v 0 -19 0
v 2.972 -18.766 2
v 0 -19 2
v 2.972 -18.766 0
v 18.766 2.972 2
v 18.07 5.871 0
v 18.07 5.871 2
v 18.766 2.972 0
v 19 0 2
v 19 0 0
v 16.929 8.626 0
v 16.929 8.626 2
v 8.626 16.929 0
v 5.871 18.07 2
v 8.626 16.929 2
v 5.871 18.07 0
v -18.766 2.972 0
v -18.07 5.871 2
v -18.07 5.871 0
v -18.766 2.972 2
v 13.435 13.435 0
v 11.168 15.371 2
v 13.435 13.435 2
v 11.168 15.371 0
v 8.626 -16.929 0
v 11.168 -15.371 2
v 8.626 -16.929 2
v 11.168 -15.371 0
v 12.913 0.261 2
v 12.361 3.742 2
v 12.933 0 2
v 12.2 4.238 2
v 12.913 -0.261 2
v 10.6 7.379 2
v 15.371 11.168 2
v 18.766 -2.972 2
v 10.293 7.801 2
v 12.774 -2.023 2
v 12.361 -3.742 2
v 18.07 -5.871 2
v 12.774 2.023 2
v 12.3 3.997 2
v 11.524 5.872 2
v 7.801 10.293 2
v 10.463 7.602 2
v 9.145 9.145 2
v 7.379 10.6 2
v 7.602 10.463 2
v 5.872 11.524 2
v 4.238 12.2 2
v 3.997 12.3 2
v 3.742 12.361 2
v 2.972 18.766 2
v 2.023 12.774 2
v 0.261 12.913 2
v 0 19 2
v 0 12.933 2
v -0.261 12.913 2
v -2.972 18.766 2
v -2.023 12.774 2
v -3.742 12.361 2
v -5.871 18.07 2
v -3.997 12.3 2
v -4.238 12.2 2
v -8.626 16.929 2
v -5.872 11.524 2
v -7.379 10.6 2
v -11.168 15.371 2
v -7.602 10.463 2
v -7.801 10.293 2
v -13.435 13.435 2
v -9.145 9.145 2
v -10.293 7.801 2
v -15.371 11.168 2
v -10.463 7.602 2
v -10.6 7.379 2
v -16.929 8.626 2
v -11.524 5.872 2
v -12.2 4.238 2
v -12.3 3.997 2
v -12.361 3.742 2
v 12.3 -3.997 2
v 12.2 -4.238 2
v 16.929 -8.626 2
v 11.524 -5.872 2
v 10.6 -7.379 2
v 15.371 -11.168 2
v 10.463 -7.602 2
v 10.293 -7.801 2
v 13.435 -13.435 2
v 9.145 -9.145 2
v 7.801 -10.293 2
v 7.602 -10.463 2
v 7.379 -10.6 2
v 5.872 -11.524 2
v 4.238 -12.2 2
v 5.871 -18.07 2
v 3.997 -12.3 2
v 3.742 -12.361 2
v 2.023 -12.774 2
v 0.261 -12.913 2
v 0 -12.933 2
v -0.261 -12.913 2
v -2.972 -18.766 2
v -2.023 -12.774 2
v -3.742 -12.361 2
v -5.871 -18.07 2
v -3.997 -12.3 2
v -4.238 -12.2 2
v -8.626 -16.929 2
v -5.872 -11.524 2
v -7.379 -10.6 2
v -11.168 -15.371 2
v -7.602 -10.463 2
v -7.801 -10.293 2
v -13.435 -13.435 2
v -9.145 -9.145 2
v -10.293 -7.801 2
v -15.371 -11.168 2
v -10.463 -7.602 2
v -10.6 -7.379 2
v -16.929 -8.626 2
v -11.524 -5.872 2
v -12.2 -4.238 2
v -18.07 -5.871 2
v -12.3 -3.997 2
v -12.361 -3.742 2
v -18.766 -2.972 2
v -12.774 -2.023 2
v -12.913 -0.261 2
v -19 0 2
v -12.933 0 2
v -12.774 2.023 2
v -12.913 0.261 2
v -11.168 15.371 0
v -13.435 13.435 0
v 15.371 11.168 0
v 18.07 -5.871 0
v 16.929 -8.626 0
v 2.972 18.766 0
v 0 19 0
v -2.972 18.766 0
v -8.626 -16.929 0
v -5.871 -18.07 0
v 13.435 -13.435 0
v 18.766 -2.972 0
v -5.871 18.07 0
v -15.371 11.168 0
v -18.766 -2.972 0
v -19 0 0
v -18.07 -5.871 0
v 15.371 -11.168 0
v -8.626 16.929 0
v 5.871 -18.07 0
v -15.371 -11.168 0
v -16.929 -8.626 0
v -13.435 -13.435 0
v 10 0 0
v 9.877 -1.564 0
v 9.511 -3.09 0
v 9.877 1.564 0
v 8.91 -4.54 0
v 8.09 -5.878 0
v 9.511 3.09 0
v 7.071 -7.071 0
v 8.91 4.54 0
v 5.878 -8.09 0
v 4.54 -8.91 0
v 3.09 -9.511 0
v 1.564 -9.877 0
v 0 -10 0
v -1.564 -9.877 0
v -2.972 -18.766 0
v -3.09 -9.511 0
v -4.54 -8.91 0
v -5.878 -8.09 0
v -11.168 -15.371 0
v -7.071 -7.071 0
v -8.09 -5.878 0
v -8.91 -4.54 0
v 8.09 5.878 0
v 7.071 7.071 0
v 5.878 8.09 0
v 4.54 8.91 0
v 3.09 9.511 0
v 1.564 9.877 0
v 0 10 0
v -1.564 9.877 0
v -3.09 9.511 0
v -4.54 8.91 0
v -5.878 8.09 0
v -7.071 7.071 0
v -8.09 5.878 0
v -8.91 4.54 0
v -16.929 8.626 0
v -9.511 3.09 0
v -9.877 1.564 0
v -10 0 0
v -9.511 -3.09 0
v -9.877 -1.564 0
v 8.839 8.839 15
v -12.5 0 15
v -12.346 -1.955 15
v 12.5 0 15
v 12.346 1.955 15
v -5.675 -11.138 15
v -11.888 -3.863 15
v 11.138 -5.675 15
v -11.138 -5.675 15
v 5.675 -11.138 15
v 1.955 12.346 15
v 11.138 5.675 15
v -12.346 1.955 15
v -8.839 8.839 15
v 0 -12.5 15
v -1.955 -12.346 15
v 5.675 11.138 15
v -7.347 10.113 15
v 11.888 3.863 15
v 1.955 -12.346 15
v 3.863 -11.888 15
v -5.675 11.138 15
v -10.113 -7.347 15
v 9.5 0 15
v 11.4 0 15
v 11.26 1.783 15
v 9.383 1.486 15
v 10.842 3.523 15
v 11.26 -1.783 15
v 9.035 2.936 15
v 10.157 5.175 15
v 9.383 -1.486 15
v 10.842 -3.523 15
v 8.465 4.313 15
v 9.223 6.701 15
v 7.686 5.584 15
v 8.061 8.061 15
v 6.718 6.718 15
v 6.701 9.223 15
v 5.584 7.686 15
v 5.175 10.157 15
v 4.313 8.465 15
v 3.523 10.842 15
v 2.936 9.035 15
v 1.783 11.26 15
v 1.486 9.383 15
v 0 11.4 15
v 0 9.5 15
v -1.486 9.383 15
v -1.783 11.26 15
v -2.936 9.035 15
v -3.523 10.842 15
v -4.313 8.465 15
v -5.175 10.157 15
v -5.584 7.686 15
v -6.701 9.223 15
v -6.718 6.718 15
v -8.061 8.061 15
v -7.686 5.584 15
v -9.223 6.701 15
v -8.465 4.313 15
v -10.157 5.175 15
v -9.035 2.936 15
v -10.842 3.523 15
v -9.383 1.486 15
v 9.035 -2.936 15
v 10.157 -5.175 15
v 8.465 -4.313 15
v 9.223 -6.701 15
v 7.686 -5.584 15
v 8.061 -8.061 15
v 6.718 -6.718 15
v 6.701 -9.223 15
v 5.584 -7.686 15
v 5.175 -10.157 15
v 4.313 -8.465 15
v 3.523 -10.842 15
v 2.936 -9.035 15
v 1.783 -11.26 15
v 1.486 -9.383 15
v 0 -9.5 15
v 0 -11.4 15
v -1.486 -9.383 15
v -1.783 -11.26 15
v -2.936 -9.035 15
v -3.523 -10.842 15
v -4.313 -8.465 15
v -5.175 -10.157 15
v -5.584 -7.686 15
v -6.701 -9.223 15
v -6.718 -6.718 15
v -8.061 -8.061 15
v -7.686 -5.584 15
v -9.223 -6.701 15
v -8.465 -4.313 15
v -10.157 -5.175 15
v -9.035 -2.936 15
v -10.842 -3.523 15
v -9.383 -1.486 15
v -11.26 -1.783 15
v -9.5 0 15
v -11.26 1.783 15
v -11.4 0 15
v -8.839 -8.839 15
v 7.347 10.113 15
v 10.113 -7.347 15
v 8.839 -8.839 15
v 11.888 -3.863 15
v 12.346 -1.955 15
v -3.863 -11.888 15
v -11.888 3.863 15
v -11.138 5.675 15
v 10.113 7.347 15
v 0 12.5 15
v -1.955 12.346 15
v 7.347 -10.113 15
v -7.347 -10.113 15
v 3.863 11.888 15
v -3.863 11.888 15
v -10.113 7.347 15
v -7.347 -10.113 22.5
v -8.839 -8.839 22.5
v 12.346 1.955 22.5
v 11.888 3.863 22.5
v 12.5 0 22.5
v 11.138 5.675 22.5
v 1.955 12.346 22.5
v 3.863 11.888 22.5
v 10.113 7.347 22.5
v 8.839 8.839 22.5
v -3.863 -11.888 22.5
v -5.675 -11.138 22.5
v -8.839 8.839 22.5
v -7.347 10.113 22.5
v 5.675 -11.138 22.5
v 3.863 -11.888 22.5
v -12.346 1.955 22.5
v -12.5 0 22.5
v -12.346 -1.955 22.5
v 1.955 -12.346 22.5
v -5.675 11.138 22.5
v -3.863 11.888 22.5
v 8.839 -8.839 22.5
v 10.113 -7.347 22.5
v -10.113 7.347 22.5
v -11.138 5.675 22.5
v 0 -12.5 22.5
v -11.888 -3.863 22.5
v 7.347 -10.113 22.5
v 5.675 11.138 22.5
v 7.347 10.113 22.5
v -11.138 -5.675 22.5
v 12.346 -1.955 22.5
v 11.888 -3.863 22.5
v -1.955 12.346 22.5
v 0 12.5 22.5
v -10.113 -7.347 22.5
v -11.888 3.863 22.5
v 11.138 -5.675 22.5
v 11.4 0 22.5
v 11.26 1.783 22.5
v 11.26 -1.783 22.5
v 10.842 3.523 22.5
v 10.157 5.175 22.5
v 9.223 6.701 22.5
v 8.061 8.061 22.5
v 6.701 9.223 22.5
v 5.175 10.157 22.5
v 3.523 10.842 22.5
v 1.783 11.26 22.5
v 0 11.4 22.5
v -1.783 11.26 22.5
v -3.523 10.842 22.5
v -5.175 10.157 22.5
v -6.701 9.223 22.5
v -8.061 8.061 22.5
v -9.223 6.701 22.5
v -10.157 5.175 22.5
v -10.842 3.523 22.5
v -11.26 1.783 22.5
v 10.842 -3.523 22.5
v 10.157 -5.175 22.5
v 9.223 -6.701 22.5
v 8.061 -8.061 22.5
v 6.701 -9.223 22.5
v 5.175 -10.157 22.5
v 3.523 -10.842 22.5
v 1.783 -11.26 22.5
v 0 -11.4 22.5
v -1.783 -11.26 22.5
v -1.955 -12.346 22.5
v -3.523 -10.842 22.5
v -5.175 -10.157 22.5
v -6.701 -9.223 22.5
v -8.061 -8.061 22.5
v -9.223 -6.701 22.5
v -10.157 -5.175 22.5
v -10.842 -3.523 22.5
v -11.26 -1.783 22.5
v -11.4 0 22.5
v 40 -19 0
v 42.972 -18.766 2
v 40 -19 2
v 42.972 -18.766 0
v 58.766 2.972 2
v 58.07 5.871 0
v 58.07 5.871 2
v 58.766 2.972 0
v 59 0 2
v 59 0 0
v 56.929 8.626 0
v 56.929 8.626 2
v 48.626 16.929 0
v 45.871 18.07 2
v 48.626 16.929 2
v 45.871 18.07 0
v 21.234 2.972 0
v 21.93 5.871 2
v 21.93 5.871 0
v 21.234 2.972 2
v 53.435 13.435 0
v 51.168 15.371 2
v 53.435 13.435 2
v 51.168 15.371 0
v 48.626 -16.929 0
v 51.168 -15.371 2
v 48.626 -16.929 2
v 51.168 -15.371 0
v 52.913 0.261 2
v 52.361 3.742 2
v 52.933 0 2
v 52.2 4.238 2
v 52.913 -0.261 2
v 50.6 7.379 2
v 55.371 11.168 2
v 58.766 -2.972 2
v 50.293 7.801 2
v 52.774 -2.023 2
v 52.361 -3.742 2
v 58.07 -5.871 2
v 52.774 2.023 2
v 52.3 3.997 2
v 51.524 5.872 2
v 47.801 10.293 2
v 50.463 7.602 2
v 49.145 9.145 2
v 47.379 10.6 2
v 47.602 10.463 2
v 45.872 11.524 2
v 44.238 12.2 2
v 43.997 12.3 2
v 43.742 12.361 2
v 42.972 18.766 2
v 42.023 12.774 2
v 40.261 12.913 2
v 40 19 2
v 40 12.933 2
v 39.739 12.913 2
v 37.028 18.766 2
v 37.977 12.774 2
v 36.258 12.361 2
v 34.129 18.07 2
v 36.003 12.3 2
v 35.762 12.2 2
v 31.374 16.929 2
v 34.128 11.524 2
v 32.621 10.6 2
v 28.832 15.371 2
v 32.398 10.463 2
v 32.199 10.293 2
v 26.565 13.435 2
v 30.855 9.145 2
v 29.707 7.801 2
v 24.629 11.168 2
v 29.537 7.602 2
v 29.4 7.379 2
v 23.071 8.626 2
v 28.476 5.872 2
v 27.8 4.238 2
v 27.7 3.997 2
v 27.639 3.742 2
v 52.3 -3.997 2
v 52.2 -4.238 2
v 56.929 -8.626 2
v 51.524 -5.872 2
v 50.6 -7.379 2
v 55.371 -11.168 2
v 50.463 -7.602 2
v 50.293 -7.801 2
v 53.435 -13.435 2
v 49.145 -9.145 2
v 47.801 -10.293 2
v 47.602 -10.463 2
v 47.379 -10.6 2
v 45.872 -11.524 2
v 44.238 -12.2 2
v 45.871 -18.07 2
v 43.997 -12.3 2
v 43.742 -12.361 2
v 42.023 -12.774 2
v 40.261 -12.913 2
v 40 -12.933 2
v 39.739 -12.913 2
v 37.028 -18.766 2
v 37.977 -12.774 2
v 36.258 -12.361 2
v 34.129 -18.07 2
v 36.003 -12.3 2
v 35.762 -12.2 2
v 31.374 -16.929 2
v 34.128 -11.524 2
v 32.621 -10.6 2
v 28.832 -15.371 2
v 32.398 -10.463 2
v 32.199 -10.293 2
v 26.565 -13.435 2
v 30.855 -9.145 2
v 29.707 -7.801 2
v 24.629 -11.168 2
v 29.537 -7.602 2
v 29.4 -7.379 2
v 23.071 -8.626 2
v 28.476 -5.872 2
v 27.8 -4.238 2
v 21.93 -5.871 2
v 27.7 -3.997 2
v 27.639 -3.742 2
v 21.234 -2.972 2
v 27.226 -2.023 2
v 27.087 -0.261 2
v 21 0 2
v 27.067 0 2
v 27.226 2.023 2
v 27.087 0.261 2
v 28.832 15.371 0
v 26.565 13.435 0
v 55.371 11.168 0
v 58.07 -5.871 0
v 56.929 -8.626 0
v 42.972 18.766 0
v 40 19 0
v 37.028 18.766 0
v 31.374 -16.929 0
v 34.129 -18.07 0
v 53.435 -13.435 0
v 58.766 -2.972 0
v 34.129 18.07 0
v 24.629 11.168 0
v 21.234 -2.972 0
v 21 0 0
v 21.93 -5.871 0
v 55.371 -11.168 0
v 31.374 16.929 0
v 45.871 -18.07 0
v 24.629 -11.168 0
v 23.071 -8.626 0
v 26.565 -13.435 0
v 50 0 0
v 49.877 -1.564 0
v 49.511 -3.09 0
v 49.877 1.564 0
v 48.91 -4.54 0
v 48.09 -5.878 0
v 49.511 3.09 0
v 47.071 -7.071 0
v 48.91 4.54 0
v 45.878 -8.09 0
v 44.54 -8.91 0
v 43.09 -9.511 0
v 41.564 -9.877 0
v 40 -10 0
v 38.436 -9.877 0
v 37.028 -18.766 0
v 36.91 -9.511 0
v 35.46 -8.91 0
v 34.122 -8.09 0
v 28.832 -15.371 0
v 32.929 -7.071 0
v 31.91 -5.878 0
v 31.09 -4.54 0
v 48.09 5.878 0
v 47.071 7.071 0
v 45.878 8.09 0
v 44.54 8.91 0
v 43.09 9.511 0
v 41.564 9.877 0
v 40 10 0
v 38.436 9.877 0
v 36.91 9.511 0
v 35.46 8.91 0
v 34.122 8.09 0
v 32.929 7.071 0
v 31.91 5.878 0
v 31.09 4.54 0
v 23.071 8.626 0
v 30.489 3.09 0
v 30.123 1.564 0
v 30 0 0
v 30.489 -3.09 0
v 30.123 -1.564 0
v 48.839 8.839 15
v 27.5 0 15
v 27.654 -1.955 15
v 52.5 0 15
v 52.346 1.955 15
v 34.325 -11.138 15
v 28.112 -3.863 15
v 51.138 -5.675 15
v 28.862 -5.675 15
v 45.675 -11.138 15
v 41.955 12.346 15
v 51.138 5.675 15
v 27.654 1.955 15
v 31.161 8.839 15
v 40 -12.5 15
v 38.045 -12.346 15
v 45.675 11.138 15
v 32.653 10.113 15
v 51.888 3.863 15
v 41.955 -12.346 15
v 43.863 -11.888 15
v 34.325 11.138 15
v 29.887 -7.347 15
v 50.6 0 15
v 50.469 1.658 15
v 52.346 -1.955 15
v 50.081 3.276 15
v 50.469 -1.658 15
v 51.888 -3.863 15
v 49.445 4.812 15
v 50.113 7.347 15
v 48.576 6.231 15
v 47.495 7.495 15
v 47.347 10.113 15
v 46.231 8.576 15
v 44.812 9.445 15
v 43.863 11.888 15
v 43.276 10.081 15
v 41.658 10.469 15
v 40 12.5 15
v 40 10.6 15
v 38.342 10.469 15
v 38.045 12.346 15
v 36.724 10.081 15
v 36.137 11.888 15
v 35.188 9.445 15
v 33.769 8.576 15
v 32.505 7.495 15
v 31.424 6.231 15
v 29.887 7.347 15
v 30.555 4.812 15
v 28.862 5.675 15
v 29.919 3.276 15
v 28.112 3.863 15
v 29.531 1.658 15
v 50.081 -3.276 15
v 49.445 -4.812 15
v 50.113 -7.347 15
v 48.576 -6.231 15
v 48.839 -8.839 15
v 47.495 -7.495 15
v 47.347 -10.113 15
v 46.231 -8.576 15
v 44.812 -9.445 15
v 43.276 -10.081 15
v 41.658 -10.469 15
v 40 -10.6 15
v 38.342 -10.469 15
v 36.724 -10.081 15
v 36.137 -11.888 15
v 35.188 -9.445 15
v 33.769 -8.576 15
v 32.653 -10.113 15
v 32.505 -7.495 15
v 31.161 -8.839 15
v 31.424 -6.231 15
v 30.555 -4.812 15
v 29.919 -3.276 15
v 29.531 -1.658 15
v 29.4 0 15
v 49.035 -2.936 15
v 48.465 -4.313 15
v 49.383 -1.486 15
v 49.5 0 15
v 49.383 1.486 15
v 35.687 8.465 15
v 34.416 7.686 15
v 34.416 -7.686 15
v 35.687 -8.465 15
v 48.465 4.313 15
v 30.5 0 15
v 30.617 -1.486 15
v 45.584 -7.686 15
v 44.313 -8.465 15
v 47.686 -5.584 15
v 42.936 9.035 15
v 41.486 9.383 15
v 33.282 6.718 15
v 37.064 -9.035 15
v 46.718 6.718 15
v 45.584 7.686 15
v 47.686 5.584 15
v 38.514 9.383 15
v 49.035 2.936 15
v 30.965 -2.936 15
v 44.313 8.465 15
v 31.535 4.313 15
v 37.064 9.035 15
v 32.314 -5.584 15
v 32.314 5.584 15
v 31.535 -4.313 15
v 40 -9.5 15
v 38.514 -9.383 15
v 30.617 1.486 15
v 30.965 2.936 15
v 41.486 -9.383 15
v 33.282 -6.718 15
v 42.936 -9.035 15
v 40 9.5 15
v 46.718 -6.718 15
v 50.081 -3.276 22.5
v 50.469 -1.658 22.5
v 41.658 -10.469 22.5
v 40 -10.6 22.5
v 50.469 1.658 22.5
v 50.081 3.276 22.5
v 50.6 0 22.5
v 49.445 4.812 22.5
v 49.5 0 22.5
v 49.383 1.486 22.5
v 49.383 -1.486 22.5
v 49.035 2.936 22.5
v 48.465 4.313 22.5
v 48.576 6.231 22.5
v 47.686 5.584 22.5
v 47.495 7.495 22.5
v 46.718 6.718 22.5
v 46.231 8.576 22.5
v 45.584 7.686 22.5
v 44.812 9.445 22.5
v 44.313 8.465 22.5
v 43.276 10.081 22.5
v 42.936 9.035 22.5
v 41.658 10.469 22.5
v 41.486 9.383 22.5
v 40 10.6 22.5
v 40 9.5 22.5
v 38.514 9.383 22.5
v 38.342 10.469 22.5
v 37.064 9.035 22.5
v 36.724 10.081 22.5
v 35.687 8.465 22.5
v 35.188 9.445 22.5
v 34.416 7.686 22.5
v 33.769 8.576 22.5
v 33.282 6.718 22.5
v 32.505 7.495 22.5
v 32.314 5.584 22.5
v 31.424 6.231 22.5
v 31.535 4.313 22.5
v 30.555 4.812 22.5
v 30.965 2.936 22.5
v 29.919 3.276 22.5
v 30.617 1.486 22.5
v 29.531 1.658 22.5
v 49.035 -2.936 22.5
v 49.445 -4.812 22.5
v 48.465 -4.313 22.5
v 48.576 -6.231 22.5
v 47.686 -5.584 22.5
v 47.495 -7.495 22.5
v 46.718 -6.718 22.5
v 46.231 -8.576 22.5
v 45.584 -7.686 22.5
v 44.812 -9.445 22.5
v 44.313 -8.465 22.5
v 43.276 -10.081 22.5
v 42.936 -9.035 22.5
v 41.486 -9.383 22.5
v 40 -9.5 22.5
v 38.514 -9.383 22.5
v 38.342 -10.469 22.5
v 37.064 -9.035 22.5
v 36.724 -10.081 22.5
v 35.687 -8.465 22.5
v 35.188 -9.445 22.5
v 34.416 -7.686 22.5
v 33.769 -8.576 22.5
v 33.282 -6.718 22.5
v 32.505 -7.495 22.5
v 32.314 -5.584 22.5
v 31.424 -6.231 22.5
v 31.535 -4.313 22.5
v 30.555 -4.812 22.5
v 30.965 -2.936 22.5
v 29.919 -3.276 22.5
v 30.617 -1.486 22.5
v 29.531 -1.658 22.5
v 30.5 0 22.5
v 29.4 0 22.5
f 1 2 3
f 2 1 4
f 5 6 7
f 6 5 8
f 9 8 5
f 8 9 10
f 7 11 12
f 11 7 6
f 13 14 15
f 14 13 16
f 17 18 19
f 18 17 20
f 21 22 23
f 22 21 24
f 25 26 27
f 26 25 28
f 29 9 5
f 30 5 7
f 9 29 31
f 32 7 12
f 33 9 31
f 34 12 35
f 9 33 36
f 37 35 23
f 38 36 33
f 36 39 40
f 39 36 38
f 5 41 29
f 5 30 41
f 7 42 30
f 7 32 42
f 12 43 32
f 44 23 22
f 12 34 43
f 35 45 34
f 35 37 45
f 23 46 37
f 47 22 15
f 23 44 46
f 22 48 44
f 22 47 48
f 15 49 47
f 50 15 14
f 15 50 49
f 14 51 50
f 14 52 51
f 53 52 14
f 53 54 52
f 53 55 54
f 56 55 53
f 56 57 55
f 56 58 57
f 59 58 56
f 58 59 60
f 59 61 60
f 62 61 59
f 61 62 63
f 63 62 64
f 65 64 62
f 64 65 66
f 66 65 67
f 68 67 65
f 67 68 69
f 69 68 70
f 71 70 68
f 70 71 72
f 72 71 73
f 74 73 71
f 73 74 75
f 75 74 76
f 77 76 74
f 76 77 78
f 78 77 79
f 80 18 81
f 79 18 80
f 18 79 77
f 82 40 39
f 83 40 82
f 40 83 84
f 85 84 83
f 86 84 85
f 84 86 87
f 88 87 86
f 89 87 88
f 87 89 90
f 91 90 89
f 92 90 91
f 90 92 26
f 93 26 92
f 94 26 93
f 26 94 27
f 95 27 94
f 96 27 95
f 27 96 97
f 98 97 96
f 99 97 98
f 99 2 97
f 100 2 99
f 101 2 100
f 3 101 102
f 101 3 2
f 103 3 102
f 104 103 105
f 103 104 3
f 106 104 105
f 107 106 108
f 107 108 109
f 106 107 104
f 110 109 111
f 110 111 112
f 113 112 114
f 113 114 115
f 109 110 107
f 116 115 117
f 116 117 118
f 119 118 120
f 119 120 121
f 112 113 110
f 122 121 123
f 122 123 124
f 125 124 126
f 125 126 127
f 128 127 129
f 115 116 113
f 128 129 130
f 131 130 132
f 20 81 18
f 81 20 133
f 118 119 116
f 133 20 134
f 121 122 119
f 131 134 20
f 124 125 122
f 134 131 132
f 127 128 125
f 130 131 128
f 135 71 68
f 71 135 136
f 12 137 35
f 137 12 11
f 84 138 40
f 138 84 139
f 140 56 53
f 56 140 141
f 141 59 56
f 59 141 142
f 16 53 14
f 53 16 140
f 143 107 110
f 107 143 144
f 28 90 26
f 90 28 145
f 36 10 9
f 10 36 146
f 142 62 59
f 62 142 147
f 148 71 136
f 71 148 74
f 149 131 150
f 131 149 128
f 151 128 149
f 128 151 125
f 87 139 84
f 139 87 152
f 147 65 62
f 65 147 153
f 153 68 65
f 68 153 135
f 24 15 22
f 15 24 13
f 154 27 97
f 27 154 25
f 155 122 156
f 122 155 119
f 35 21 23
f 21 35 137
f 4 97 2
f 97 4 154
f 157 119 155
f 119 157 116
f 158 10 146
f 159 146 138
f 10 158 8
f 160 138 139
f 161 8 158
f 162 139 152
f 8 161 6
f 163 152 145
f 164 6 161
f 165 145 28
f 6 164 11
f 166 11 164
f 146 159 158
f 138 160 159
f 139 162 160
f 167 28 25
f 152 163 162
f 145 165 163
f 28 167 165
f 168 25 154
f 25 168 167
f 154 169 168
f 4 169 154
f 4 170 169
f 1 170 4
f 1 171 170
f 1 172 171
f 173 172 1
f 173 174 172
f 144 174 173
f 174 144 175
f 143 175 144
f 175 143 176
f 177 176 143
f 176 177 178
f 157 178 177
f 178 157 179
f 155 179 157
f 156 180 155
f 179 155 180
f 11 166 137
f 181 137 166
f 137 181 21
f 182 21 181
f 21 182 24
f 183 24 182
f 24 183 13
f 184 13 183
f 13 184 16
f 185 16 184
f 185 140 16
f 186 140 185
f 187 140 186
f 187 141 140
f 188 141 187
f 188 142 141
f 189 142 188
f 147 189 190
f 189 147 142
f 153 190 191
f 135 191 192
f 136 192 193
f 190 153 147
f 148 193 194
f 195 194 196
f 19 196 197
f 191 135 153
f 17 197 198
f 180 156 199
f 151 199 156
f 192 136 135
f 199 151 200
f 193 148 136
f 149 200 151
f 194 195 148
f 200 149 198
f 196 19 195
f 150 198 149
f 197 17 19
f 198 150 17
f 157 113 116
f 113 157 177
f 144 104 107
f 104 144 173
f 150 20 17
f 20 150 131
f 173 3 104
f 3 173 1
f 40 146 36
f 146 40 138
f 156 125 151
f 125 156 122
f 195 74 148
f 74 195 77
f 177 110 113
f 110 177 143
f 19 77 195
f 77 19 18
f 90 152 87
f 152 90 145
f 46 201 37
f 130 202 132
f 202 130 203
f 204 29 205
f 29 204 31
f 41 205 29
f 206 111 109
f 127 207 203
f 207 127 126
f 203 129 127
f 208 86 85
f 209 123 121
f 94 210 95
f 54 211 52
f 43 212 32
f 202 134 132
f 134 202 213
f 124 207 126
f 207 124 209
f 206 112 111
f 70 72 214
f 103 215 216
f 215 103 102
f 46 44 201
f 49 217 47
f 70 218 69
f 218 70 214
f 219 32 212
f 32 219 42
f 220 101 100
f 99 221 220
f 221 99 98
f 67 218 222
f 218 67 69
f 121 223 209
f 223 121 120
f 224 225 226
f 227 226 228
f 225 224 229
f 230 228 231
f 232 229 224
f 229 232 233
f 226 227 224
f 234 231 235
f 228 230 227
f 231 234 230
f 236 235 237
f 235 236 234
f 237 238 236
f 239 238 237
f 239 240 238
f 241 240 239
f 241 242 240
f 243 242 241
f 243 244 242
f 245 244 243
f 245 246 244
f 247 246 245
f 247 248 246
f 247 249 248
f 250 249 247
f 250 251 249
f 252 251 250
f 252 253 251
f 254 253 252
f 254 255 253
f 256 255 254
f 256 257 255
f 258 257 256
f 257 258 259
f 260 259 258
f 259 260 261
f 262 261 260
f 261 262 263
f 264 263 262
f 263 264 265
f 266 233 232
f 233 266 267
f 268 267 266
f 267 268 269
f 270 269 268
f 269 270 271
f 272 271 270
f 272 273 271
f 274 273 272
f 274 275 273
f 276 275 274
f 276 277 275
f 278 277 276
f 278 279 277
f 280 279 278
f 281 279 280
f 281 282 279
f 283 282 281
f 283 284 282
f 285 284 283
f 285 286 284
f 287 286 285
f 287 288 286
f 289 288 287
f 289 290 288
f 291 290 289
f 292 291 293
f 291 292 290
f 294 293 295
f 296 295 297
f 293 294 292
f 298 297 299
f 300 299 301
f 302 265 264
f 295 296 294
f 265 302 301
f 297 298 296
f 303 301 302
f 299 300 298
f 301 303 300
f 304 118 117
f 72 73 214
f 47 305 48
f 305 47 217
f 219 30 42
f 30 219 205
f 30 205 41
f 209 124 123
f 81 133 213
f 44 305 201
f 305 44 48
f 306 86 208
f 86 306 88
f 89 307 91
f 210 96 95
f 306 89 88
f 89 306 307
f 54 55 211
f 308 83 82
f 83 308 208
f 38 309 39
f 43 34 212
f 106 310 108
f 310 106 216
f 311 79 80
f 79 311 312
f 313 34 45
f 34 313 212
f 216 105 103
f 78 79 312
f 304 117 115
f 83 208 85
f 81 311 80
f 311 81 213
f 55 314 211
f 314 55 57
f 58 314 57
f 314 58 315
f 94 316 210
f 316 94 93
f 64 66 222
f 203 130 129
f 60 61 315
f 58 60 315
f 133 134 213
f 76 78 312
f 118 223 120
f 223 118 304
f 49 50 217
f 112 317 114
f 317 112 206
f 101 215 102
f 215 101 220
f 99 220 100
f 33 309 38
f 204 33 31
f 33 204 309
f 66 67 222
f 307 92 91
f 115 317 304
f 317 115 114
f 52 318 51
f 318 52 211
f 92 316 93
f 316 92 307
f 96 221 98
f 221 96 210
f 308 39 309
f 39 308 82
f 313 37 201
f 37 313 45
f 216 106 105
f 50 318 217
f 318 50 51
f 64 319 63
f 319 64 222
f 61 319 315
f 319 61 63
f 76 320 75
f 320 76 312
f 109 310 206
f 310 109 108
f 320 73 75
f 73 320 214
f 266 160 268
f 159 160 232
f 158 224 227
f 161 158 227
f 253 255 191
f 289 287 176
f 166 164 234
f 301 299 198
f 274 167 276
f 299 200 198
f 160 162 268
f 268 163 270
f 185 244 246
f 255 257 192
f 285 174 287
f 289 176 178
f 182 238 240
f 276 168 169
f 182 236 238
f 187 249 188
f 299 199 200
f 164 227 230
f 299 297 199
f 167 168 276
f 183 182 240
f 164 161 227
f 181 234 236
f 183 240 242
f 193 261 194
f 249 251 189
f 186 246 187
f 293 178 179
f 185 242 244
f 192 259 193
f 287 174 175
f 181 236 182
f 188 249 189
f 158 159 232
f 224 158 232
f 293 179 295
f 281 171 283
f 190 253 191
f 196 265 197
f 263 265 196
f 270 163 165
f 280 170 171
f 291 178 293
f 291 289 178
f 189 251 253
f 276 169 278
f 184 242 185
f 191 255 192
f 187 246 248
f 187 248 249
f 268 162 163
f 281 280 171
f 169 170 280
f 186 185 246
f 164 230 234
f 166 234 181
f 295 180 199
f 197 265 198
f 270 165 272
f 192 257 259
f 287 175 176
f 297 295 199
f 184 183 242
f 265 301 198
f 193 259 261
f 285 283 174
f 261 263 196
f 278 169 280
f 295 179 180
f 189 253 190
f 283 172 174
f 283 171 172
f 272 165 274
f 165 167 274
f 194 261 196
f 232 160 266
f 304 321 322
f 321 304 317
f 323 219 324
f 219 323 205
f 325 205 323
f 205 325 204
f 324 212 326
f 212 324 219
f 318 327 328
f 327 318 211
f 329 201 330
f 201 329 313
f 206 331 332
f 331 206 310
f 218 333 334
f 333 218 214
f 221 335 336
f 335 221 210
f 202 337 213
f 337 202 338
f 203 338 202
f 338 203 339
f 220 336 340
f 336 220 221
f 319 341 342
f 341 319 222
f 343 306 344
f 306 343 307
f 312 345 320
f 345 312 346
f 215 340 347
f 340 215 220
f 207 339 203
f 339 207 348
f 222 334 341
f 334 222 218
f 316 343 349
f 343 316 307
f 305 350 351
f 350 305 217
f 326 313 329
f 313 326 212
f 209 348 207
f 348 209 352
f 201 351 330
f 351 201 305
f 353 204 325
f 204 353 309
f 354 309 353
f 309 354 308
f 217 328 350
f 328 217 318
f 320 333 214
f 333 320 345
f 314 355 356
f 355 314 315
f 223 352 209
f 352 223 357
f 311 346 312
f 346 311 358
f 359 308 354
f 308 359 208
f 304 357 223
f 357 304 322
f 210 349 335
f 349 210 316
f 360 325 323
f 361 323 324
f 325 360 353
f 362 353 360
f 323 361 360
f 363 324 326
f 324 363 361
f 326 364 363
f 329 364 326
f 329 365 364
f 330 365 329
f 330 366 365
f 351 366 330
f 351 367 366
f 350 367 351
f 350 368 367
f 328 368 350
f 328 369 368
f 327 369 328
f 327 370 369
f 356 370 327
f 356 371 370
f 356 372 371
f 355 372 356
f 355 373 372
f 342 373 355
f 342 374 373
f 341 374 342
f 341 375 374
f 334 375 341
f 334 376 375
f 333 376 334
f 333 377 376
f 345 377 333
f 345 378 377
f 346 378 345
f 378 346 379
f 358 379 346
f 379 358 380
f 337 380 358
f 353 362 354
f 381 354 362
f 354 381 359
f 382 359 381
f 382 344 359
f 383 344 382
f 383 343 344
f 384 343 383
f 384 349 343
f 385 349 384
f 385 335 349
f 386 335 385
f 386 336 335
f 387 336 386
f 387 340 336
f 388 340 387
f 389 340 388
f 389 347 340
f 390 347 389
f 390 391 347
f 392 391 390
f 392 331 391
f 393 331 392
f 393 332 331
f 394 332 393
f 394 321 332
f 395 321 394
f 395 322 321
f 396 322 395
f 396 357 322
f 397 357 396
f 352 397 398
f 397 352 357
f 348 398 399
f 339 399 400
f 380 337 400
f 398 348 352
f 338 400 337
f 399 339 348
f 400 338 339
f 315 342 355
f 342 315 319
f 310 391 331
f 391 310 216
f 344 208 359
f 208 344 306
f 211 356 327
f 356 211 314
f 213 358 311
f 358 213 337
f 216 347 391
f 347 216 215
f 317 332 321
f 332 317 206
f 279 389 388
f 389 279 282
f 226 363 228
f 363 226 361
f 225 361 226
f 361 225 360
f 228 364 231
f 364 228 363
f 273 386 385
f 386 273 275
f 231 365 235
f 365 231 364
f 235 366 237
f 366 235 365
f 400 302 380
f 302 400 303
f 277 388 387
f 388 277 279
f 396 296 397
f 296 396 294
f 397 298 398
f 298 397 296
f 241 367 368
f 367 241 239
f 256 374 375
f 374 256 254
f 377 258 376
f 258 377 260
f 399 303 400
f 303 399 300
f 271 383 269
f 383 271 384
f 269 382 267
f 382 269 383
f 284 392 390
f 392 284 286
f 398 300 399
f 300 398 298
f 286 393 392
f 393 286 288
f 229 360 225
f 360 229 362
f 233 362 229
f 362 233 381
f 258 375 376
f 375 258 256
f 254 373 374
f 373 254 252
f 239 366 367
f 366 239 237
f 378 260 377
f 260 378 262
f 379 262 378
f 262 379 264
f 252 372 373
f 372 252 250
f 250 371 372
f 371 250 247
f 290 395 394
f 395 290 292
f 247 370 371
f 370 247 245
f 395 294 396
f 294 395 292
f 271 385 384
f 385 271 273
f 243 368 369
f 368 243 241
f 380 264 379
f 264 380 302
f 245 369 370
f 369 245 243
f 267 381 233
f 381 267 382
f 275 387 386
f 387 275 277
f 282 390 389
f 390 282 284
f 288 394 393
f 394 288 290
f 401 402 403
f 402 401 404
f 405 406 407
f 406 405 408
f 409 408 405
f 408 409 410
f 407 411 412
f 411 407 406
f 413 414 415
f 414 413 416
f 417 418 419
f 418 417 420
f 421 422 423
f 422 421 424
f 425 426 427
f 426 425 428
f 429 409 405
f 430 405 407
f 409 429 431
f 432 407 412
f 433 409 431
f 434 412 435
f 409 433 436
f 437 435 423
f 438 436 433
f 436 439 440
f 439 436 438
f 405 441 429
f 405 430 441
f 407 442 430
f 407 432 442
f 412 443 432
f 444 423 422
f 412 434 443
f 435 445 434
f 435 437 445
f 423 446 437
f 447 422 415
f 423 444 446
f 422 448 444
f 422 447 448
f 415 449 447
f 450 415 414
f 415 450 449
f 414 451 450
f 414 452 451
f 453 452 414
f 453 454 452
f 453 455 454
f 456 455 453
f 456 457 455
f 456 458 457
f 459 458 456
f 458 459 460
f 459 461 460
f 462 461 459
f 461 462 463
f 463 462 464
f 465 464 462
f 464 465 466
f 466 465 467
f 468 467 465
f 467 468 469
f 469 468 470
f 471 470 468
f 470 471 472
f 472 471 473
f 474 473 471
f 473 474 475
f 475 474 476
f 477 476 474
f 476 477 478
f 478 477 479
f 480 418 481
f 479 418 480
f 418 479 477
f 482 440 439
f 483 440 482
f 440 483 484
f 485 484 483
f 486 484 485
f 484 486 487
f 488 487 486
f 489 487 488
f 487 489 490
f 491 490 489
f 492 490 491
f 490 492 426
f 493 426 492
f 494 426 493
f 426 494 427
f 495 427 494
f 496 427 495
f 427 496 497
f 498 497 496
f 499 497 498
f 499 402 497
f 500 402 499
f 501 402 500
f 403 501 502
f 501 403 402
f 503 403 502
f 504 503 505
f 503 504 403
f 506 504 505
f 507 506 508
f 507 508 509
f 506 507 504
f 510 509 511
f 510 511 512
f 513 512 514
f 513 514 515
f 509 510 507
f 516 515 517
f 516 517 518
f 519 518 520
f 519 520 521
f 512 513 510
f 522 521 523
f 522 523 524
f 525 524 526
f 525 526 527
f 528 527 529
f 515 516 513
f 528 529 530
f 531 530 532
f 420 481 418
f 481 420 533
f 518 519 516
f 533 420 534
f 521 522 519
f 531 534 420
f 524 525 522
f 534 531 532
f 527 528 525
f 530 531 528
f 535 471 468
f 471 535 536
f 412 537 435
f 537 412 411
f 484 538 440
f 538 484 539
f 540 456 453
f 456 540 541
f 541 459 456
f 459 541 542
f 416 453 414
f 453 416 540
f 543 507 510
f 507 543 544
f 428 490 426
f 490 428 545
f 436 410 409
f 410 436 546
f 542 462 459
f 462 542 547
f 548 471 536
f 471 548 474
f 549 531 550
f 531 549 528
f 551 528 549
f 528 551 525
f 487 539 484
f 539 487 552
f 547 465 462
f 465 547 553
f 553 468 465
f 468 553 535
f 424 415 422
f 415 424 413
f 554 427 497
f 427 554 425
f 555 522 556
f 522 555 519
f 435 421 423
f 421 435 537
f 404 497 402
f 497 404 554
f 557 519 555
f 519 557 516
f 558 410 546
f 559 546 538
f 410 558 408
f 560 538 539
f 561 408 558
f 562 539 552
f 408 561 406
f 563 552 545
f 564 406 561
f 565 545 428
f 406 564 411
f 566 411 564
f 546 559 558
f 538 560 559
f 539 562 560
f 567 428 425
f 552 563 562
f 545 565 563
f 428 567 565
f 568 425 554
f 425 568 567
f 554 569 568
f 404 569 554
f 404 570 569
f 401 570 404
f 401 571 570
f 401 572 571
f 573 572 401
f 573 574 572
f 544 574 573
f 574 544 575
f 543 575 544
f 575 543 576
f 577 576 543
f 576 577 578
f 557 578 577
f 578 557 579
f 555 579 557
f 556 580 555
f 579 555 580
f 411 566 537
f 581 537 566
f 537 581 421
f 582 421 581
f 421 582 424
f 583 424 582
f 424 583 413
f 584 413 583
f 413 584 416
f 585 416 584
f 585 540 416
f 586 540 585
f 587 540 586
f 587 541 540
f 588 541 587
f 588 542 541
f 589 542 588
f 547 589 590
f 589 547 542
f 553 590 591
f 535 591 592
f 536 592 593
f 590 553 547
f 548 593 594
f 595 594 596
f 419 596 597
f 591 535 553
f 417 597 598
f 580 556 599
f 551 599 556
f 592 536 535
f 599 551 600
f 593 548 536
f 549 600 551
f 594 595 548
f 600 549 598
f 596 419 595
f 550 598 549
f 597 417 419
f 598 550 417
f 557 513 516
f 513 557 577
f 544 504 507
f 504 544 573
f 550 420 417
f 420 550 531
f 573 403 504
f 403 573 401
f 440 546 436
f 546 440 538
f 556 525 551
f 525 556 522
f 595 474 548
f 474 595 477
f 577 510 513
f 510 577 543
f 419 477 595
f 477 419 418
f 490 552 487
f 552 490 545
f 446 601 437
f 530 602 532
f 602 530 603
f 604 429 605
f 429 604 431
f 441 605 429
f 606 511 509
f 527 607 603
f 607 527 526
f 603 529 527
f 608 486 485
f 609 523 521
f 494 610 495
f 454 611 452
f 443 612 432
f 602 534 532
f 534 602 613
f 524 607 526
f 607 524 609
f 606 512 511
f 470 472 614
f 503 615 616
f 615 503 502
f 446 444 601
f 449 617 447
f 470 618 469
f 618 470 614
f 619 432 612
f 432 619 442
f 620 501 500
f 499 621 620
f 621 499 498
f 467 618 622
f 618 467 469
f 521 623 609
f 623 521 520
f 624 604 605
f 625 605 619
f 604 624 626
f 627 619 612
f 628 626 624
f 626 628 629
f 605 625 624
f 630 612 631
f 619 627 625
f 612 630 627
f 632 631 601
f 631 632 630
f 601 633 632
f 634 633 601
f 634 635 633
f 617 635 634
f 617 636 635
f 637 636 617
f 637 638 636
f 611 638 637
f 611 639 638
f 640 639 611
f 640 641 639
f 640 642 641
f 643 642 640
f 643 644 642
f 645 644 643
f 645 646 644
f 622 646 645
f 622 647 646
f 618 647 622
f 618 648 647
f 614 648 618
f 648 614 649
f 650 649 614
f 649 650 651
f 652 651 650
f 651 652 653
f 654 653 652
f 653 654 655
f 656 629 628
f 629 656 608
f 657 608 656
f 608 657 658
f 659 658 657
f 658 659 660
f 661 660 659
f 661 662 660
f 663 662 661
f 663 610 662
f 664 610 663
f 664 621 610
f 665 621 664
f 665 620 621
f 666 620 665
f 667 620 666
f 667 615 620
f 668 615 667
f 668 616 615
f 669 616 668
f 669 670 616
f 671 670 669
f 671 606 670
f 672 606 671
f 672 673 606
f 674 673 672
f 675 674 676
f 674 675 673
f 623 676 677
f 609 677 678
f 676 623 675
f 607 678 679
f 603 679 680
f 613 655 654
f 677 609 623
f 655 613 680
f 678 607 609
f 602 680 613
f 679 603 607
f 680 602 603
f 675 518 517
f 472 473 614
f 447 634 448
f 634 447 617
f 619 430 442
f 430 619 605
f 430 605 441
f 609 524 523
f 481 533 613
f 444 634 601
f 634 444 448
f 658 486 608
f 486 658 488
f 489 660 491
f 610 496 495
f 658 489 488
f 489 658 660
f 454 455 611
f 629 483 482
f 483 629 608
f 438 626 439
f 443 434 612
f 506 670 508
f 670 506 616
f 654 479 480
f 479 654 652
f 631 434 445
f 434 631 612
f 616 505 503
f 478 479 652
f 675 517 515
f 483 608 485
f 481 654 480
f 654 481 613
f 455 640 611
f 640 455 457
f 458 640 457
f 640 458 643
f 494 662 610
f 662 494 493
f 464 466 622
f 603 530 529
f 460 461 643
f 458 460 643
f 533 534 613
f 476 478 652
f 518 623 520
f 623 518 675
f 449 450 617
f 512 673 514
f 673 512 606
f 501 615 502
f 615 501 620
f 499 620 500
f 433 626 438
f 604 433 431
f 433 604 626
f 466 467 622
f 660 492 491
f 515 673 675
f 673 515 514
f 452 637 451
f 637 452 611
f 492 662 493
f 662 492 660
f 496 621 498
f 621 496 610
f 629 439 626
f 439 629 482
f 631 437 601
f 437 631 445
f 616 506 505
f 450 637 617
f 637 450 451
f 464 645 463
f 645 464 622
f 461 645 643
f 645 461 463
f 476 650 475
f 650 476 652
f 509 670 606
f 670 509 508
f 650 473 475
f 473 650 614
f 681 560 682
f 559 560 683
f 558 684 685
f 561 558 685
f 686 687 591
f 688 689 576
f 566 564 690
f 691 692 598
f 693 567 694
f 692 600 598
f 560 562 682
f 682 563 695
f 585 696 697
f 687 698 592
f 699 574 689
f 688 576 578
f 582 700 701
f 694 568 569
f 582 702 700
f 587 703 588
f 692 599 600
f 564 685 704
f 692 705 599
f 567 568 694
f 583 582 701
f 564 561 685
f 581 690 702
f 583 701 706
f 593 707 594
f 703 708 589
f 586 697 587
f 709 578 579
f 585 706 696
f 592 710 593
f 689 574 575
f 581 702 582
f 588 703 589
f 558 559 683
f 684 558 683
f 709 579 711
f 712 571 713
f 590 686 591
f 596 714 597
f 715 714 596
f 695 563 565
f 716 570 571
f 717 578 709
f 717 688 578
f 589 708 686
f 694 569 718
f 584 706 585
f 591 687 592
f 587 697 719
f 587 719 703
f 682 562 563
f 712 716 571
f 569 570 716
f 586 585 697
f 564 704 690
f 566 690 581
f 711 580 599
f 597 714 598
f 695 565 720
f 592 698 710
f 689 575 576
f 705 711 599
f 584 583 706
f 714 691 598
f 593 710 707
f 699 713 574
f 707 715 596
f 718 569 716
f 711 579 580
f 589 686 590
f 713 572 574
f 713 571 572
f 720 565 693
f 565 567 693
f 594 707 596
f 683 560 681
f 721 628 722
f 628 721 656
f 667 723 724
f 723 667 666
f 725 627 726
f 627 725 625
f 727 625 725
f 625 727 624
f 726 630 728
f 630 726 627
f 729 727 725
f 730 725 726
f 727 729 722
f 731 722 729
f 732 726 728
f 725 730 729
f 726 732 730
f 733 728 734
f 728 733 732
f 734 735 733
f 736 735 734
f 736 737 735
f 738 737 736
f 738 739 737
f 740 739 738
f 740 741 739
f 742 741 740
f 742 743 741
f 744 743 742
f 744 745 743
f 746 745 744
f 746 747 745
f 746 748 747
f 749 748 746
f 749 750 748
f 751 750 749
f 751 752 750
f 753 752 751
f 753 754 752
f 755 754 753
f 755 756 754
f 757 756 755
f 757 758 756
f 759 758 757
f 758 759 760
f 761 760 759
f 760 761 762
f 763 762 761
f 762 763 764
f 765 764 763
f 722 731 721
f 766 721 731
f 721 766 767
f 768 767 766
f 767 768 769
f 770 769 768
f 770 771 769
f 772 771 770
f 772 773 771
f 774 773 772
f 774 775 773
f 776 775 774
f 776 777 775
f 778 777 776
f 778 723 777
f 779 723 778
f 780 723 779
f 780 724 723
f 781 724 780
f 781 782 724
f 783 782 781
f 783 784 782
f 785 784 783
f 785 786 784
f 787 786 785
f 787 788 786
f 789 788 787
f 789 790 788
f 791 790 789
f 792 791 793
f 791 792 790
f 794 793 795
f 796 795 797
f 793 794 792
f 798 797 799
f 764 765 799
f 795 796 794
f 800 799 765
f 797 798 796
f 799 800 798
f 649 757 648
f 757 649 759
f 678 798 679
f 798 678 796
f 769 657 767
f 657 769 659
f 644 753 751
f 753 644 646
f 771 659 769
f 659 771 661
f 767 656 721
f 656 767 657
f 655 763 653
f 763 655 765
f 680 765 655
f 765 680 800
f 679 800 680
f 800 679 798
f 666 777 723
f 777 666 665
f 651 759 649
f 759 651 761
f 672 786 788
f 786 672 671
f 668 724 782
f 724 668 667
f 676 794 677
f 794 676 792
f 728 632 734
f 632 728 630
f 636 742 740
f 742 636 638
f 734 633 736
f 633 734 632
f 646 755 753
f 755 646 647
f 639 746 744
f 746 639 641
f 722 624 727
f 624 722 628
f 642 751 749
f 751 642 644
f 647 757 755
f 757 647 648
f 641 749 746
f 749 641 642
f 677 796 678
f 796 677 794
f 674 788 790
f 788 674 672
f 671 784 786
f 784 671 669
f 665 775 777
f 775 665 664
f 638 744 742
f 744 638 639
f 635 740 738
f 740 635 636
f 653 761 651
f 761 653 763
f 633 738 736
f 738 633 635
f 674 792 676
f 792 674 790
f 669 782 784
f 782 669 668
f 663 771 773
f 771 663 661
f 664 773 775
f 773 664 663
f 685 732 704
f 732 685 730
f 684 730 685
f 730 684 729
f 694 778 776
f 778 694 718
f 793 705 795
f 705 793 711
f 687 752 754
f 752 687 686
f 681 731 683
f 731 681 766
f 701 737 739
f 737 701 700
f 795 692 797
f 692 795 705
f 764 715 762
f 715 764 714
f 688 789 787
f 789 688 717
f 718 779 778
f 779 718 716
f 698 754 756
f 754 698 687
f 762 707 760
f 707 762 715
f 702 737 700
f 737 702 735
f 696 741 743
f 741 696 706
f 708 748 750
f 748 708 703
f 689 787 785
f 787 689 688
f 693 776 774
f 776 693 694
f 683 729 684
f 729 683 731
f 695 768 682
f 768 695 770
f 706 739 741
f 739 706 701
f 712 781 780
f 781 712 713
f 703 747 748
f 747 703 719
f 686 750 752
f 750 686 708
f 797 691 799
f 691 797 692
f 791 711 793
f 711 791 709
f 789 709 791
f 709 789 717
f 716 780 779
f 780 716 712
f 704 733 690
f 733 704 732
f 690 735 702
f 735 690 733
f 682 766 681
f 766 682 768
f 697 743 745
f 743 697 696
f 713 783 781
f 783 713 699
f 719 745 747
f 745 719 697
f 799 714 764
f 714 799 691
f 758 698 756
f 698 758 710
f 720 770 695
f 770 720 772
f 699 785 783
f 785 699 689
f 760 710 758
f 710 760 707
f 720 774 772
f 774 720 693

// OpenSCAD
$fn = 40;
thickness = 2;
spoolThickness = 3;
rimRadius = (50-2*8+4)/2;
overlap = 7.5;
spoolWidth = 26;
spoolRadiusBase = 26/2;
spoolRadiusTop = 25/2;
halfSpoolHeight = thickness+spoolWidth/2;
tolerance = 0.4;

module baseSpool() {
    difference() {
        union() {
            cylinder(r=rimRadius,h=thickness);
            cylinder(r1=spoolRadiusBase,r2=spoolRadiusTop,h=halfSpoolHeight);
        }
    cylinder(r1=spoolRadiusBase-spoolThickness,r2=spoolRadiusTop-spoolThickness,h=halfSpoolHeight);
    }
}



baseSpool();
translate([0,0,halfSpoolHeight]) {
    difference() {
        cylinder(r=spoolRadiusTop, h=overlap);
        cylinder(r=spoolRadiusTop-spoolThickness/2 + tolerance, h=overlap);
    }
}

translate([40, 0, 0]) {
    baseSpool();
    translate([0,0,halfSpoolHeight]) {
        difference() {
            cylinder(r=spoolRadiusTop-spoolThickness/2-tolerance, h=overlap);
            cylinder(r=spoolRadiusTop-spoolThickness, h=overlap);
        }
    }
}
